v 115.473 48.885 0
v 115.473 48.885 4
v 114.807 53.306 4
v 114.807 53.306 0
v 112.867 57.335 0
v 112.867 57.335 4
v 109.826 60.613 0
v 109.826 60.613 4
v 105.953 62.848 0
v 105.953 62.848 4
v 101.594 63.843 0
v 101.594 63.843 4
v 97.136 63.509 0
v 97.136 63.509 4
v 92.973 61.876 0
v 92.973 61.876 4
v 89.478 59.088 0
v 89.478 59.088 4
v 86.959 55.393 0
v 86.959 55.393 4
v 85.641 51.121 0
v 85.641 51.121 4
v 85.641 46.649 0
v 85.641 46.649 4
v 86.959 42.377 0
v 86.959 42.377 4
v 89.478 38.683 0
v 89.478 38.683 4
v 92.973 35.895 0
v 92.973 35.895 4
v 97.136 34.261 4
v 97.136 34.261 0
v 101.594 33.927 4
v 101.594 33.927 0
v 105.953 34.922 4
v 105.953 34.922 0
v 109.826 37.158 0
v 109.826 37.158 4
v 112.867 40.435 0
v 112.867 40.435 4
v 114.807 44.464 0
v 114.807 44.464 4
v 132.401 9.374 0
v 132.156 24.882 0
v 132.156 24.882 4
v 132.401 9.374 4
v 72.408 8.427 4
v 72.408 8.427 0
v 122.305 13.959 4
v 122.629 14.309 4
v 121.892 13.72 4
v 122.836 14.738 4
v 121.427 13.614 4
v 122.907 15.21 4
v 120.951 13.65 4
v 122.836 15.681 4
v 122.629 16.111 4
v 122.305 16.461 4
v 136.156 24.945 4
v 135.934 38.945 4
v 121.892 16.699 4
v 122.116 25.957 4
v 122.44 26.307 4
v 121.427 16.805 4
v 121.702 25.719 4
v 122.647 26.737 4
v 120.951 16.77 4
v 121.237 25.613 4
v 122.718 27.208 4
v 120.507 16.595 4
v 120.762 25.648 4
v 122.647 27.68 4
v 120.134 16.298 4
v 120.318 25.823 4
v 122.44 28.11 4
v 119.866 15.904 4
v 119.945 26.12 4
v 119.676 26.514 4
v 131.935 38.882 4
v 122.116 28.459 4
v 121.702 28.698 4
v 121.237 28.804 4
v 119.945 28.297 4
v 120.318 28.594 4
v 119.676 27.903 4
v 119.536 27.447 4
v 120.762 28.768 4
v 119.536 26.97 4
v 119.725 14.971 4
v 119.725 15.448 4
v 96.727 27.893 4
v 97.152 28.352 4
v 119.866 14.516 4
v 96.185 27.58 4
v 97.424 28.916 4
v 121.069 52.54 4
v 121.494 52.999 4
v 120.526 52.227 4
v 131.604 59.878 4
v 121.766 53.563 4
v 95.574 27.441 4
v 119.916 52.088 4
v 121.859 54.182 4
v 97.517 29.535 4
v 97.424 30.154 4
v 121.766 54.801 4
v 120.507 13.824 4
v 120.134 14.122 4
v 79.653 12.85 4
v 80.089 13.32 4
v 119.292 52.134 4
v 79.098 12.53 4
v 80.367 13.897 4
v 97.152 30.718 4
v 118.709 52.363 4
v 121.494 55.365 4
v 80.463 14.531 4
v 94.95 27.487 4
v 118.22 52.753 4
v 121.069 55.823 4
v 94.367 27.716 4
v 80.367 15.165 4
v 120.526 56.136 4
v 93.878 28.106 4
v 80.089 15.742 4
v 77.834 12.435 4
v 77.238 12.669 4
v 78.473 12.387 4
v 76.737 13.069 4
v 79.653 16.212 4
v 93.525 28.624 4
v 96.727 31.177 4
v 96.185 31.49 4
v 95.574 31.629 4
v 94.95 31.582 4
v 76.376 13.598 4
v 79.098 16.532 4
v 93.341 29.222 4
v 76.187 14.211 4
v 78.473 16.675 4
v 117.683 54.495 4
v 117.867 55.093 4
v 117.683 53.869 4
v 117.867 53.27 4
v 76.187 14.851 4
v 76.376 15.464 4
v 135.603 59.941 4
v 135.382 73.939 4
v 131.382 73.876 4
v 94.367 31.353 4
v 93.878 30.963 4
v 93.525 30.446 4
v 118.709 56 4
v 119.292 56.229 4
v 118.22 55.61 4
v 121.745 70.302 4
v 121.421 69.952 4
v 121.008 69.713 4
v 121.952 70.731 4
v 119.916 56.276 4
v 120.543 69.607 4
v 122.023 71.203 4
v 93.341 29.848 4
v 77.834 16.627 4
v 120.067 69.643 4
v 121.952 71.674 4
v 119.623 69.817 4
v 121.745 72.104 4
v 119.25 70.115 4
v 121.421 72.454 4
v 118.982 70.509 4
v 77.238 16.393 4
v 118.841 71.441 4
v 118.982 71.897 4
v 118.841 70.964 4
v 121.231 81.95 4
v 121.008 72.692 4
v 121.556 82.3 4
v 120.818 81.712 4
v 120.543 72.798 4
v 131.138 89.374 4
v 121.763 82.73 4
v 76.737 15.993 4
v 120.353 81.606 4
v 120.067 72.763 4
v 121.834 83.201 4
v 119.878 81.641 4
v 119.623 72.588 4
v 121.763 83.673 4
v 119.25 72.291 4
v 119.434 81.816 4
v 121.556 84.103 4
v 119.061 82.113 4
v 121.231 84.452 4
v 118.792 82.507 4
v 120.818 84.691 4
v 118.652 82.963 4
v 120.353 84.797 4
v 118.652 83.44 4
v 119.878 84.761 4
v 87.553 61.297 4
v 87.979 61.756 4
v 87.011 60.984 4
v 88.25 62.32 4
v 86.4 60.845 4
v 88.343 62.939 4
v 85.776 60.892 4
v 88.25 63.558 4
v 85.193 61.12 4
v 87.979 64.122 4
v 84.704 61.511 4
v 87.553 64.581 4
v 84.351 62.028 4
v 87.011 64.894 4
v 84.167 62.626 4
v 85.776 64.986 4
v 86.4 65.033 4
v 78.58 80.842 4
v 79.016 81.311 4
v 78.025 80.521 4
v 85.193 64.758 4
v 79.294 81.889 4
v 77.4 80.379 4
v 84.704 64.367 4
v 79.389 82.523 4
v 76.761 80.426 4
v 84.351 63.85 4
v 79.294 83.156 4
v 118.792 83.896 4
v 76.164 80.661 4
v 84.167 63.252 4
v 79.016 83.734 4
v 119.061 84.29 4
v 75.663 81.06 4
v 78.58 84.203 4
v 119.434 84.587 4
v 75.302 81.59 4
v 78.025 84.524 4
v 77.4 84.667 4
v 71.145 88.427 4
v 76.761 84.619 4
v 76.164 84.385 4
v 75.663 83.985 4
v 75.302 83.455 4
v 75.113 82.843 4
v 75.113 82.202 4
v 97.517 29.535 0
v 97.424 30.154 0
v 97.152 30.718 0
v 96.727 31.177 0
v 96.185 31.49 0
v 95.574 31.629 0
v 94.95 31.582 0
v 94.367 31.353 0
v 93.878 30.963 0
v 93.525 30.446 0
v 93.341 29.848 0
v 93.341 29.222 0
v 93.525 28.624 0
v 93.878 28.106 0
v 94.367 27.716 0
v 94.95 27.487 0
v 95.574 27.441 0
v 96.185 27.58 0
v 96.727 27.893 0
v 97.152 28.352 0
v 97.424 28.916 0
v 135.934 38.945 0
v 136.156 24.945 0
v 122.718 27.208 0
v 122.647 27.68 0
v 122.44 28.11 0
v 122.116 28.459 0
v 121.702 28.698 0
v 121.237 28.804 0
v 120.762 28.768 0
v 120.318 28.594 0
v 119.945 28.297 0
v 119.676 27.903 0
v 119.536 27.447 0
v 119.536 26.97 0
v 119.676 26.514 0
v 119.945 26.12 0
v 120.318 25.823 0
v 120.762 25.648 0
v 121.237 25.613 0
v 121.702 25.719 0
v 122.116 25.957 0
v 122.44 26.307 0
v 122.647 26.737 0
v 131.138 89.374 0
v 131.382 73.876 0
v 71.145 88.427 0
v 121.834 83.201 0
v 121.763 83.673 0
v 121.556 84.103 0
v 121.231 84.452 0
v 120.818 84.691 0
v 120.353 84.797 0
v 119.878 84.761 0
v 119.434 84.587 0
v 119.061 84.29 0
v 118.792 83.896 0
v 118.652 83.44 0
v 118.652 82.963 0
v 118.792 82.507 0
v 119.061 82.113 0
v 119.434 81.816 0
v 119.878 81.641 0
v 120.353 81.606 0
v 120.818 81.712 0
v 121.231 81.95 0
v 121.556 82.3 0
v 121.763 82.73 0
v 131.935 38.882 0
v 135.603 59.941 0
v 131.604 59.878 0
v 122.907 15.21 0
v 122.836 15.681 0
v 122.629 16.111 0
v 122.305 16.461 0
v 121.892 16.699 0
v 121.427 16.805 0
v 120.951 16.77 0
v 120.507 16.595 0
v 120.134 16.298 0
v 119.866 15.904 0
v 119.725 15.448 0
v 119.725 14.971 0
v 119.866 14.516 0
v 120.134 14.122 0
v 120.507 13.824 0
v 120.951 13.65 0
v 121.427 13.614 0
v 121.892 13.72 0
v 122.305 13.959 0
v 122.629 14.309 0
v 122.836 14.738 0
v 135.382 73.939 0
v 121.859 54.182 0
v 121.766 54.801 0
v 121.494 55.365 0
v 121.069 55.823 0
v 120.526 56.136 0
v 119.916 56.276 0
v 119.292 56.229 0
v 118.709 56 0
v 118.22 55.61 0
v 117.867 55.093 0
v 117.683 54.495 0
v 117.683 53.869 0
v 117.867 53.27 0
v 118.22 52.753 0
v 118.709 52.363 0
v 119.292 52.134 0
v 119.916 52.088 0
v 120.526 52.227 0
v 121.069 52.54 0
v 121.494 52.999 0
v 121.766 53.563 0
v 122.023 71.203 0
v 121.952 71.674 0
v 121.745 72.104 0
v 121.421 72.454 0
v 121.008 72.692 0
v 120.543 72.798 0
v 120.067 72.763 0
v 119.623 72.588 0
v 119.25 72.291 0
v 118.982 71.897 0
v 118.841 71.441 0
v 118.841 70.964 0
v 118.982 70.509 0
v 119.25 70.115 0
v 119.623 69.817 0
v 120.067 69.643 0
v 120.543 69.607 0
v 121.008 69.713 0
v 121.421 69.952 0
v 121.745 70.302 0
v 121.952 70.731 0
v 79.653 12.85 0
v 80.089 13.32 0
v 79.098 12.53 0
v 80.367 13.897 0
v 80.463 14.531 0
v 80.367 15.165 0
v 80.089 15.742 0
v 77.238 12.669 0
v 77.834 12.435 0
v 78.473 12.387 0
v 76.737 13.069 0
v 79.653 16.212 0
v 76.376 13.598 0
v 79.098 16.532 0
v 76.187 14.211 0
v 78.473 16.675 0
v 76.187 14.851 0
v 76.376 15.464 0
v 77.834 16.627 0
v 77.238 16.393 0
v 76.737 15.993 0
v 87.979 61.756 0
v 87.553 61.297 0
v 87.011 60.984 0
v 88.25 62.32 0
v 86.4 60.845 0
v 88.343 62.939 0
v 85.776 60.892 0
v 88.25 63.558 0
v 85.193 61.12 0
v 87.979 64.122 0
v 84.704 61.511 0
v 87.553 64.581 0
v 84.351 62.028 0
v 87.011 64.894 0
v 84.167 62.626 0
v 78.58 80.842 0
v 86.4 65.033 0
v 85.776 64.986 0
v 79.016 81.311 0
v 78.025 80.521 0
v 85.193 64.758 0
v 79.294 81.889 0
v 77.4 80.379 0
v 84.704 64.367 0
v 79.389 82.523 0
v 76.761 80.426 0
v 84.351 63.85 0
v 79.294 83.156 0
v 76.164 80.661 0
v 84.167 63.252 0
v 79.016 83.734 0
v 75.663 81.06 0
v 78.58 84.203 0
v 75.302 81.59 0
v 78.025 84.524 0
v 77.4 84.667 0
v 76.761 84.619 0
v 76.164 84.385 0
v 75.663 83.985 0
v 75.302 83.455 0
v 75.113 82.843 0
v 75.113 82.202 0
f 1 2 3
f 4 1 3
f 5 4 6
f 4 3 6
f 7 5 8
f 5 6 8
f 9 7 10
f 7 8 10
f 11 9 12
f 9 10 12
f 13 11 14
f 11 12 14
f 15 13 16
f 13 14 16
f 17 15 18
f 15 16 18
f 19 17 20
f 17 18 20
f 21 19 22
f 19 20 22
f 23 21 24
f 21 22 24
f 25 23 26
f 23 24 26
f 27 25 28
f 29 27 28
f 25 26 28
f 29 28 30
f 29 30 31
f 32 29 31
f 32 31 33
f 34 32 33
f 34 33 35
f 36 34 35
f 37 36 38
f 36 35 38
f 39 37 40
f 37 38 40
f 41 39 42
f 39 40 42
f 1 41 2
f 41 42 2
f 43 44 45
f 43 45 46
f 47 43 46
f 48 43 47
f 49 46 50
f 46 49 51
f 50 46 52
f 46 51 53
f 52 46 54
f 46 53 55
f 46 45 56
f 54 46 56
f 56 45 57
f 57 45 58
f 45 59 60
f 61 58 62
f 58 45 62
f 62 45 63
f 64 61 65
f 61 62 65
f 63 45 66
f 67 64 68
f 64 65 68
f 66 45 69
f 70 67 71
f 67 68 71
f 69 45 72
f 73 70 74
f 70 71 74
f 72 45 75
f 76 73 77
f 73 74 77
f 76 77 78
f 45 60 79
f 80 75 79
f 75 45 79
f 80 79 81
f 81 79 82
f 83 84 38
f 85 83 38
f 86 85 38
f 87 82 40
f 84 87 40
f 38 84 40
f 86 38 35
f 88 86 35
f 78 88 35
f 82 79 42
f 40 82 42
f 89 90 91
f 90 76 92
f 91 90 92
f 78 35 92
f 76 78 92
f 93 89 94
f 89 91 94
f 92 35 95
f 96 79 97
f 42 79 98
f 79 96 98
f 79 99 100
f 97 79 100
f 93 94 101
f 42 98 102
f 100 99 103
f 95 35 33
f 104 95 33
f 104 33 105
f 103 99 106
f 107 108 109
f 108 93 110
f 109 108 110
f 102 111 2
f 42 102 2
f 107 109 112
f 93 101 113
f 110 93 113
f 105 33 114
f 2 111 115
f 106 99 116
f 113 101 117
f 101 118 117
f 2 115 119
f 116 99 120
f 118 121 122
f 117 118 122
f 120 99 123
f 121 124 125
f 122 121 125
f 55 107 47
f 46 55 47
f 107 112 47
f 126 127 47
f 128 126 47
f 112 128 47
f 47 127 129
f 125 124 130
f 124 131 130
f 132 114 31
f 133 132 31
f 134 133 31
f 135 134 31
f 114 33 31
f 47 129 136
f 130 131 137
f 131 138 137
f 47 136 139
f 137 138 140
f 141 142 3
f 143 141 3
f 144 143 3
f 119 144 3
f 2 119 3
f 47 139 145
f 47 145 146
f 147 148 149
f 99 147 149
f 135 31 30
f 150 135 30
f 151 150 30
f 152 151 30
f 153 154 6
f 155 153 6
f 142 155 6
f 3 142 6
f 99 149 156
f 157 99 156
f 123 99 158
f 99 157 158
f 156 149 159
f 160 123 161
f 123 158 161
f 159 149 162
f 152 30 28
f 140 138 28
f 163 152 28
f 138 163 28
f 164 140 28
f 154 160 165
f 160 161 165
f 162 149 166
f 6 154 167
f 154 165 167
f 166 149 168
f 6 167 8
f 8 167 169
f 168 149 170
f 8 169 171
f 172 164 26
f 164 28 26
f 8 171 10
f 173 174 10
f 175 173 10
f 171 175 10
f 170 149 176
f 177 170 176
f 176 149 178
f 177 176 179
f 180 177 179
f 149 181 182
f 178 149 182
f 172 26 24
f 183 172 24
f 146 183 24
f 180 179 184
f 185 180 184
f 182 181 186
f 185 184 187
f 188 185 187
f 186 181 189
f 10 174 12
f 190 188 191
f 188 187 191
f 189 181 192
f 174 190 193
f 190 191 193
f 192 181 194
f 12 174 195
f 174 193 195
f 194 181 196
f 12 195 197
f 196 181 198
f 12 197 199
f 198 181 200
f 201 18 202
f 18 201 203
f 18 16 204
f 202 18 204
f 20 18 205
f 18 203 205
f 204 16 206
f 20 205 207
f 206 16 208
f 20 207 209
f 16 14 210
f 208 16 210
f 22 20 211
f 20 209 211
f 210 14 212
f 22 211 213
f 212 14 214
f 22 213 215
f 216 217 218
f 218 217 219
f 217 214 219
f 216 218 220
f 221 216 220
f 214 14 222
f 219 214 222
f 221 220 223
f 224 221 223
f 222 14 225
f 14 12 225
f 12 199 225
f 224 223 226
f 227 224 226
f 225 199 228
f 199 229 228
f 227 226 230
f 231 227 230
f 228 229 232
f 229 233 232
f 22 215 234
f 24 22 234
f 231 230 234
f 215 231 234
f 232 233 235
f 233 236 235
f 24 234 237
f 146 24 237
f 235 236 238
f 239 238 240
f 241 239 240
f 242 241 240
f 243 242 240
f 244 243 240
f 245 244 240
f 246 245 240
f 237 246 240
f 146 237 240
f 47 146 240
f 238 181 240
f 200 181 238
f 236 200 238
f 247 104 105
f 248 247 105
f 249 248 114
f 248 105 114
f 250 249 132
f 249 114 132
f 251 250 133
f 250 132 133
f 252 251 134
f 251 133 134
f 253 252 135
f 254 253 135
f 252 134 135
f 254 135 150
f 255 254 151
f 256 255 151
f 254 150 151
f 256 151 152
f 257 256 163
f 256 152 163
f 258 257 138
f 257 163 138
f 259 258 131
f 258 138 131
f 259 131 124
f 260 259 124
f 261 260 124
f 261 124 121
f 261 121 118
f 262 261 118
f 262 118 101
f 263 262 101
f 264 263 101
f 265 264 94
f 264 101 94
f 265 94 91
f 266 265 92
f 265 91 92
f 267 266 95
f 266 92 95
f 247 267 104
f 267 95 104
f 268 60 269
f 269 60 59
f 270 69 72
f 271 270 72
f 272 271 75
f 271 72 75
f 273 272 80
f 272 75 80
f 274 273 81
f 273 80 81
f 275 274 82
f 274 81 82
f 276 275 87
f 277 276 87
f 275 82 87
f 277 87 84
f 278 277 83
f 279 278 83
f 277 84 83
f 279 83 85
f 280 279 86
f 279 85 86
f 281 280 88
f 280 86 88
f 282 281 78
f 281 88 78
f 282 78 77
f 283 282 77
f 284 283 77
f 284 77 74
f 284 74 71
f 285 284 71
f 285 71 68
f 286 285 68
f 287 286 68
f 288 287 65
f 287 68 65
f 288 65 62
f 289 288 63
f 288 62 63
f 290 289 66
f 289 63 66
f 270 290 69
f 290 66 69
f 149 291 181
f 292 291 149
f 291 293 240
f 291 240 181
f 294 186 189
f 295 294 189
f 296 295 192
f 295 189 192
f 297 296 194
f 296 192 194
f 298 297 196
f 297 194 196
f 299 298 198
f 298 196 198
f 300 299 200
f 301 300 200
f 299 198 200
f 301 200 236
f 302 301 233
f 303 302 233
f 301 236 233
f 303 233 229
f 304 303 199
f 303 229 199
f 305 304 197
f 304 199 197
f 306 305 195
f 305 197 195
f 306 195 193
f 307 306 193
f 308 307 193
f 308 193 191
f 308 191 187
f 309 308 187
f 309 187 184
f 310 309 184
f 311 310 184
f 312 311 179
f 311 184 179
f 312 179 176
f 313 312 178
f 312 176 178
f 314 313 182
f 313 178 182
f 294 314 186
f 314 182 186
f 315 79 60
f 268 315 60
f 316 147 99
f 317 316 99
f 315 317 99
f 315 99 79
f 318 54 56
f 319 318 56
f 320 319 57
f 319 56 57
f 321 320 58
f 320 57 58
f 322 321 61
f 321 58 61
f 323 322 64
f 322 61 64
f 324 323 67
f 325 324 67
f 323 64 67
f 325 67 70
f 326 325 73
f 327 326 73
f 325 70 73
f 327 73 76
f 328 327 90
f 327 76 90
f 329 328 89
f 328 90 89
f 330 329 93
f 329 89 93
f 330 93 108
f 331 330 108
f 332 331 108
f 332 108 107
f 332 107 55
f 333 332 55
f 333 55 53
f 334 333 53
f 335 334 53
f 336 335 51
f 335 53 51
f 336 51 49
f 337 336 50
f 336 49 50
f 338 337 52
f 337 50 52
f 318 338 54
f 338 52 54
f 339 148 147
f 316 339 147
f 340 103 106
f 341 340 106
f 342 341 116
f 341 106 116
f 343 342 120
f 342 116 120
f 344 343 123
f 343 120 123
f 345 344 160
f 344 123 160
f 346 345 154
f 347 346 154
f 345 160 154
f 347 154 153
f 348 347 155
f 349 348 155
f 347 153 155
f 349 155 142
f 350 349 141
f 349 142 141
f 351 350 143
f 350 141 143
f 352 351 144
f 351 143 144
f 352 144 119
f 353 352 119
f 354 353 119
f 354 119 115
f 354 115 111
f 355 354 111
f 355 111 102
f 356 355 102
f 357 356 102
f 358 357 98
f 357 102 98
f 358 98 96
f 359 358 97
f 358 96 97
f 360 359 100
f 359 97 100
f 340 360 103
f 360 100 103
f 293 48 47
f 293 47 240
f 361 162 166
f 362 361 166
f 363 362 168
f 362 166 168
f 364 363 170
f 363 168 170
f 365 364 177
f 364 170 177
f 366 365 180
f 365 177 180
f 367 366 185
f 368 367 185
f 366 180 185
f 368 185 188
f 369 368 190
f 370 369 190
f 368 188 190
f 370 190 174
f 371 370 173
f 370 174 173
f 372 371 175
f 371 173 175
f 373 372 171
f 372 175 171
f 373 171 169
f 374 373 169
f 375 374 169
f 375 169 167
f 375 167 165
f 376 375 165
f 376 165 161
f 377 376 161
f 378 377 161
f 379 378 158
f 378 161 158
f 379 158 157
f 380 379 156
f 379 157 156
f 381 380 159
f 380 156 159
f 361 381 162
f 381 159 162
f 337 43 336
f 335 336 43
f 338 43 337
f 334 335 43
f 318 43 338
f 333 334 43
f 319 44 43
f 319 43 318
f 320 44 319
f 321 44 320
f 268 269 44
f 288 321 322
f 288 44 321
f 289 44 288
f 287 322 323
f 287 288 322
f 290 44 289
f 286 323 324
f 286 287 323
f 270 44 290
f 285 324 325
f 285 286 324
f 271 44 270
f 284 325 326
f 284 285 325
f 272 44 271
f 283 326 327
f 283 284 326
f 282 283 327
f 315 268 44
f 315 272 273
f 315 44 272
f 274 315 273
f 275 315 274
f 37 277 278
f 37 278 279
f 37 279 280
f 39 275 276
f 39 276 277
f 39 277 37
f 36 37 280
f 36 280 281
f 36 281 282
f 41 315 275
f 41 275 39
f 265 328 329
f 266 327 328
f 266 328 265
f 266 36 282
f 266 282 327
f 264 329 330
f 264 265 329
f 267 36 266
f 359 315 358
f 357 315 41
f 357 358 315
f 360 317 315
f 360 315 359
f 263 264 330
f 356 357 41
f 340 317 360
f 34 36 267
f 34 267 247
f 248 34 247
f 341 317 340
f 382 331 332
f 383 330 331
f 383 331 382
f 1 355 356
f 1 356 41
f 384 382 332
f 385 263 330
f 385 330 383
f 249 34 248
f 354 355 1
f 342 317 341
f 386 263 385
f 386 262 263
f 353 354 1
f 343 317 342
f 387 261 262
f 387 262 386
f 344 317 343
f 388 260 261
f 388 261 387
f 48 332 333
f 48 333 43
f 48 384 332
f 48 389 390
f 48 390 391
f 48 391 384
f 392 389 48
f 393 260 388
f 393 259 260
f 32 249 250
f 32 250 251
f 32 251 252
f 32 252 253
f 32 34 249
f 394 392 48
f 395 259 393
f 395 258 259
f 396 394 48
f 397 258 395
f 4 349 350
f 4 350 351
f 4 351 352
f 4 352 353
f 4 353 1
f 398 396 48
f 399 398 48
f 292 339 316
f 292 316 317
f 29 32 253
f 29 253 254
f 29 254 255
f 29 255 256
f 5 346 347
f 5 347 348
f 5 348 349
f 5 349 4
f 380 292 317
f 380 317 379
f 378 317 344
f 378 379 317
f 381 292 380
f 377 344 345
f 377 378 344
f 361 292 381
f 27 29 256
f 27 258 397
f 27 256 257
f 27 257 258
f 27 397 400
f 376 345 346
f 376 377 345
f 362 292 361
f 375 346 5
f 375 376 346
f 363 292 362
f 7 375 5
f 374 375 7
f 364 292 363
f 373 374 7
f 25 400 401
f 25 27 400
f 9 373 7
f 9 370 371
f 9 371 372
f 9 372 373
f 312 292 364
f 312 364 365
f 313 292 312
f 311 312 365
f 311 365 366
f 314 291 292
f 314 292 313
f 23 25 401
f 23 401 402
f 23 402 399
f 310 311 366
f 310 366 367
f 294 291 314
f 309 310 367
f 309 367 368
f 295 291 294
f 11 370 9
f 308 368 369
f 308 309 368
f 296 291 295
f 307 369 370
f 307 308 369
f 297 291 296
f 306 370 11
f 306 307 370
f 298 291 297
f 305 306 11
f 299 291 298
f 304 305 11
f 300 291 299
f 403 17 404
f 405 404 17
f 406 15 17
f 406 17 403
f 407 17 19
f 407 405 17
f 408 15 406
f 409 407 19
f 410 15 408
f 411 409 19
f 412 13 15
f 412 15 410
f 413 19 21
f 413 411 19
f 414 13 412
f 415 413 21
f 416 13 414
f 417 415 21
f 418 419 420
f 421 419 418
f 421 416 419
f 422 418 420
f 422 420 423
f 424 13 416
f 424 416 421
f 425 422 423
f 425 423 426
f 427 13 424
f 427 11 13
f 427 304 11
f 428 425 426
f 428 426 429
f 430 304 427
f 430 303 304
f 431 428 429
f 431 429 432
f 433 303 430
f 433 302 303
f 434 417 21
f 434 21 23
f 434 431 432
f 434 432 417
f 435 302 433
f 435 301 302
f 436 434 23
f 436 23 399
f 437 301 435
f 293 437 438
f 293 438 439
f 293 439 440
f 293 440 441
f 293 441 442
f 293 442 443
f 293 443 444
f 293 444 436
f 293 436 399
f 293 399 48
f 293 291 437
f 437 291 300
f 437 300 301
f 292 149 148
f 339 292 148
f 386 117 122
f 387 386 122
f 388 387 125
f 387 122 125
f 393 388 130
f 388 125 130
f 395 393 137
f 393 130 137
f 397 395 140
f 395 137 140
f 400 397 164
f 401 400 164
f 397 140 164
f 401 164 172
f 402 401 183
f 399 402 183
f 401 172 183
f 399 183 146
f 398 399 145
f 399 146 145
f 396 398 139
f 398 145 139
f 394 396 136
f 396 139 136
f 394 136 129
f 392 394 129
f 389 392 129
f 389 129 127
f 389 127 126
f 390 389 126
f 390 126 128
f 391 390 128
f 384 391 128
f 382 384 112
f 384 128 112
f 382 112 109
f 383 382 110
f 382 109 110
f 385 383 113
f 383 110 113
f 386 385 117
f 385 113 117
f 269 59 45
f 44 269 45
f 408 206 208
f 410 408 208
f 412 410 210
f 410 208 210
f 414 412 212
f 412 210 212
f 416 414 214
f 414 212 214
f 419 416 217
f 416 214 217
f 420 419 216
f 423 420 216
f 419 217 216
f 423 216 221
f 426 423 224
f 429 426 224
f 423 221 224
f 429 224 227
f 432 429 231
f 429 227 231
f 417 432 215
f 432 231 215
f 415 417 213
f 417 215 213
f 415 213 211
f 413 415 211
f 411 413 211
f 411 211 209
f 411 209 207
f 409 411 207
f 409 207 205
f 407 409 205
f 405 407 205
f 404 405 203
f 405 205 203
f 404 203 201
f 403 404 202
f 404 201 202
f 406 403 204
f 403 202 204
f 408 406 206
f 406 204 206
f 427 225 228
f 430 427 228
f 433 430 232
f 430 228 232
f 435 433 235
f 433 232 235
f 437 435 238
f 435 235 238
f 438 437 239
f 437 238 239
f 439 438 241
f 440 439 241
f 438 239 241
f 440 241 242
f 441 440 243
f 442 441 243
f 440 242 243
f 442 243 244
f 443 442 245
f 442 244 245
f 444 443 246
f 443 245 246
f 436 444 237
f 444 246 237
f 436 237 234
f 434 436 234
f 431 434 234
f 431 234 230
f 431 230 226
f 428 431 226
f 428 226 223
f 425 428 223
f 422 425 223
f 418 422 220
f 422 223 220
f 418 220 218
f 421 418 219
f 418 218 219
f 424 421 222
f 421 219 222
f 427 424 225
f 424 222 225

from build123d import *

# Parameters (mm, degrees)
EXTRUDE_1_DEPTH     = 4
SKETCH_3_R          = 15
SKETCH_3_R_2        = 2.1
CUT_EXTRUDE_1_DEPTH = 4
SKETCH_4_R          = 2.15
CUT_EXTRUDE_2_DEPTH = 4
SKETCH_5_R          = 1.6
CUT_EXTRUDE_3_DEPTH = 4
EXTRUDE_2_DEPTH     = 4


with BuildPart() as part:
    # 草图2 → 凸台-拉伸1 (new body)
    with BuildSketch(Plane.XY):
        Polygon((131.137809217, 89.374251193), (132.400858097, 9.374251193), (72.408334633, 8.427082574), (71.145285753, 88.427082574), align=None)
    extrude(amount=EXTRUDE_1_DEPTH)

    # 草图3 → 切除-拉伸1 (cut)
    with BuildSketch(Plane.XY.offset(4)):
        with Locations((100.473333038, 48.885132061)):
            Circle(SKETCH_3_R)
        with Locations((119.759256959, 54.181653421)):
            Circle(SKETCH_3_R_2)
        with Locations((95.417293127, 29.53477133)):
            Circle(SKETCH_3_R_2)
        with Locations((86.243449028, 62.938971432)):
            Circle(SKETCH_3_R_2)
    extrude(amount=-CUT_EXTRUDE_1_DEPTH, mode=Mode.SUBTRACT)

    # 草图4 → 切除-拉伸2 (cut)
    with BuildSketch(Plane.XY.offset(4)):
        with Locations((77.239254962, 82.522547089)):
            Circle(SKETCH_4_R)
        with Locations((78.31271273, 14.531020496)):
            Circle(SKETCH_4_R)
    extrude(amount=-CUT_EXTRUDE_2_DEPTH, mode=Mode.SUBTRACT)

    # 草图5 → 切除-拉伸3 (cut)
    with BuildSketch(Plane.XY.offset(4)):
        with Locations((120.233896778, 83.201351266)):
            Circle(SKETCH_5_R)
        with Locations((120.423330501, 71.202846573)):
            Circle(SKETCH_5_R)
        with Locations((121.117920822, 27.208329366)):
            Circle(SKETCH_5_R)
        with Locations((121.307354546, 15.209824673)):
            Circle(SKETCH_5_R)
    extrude(amount=-CUT_EXTRUDE_3_DEPTH, mode=Mode.SUBTRACT)

    # 草图6 → 凸台-拉伸2 (add)
    with BuildSketch(Plane.XY.offset(4)):
        Polygon((132.156015483, 24.882288469), (131.934981929, 38.882288469), (135.934483494, 38.945433043), (136.155517047, 24.945433043), align=None)
        Polygon((131.603500455, 59.877927156), (131.382494444, 73.876182631), (135.381996008, 73.939327206), (135.60300202, 59.941071731), align=None)
    extrude(amount=-EXTRUDE_2_DEPTH)


solid = part.part
